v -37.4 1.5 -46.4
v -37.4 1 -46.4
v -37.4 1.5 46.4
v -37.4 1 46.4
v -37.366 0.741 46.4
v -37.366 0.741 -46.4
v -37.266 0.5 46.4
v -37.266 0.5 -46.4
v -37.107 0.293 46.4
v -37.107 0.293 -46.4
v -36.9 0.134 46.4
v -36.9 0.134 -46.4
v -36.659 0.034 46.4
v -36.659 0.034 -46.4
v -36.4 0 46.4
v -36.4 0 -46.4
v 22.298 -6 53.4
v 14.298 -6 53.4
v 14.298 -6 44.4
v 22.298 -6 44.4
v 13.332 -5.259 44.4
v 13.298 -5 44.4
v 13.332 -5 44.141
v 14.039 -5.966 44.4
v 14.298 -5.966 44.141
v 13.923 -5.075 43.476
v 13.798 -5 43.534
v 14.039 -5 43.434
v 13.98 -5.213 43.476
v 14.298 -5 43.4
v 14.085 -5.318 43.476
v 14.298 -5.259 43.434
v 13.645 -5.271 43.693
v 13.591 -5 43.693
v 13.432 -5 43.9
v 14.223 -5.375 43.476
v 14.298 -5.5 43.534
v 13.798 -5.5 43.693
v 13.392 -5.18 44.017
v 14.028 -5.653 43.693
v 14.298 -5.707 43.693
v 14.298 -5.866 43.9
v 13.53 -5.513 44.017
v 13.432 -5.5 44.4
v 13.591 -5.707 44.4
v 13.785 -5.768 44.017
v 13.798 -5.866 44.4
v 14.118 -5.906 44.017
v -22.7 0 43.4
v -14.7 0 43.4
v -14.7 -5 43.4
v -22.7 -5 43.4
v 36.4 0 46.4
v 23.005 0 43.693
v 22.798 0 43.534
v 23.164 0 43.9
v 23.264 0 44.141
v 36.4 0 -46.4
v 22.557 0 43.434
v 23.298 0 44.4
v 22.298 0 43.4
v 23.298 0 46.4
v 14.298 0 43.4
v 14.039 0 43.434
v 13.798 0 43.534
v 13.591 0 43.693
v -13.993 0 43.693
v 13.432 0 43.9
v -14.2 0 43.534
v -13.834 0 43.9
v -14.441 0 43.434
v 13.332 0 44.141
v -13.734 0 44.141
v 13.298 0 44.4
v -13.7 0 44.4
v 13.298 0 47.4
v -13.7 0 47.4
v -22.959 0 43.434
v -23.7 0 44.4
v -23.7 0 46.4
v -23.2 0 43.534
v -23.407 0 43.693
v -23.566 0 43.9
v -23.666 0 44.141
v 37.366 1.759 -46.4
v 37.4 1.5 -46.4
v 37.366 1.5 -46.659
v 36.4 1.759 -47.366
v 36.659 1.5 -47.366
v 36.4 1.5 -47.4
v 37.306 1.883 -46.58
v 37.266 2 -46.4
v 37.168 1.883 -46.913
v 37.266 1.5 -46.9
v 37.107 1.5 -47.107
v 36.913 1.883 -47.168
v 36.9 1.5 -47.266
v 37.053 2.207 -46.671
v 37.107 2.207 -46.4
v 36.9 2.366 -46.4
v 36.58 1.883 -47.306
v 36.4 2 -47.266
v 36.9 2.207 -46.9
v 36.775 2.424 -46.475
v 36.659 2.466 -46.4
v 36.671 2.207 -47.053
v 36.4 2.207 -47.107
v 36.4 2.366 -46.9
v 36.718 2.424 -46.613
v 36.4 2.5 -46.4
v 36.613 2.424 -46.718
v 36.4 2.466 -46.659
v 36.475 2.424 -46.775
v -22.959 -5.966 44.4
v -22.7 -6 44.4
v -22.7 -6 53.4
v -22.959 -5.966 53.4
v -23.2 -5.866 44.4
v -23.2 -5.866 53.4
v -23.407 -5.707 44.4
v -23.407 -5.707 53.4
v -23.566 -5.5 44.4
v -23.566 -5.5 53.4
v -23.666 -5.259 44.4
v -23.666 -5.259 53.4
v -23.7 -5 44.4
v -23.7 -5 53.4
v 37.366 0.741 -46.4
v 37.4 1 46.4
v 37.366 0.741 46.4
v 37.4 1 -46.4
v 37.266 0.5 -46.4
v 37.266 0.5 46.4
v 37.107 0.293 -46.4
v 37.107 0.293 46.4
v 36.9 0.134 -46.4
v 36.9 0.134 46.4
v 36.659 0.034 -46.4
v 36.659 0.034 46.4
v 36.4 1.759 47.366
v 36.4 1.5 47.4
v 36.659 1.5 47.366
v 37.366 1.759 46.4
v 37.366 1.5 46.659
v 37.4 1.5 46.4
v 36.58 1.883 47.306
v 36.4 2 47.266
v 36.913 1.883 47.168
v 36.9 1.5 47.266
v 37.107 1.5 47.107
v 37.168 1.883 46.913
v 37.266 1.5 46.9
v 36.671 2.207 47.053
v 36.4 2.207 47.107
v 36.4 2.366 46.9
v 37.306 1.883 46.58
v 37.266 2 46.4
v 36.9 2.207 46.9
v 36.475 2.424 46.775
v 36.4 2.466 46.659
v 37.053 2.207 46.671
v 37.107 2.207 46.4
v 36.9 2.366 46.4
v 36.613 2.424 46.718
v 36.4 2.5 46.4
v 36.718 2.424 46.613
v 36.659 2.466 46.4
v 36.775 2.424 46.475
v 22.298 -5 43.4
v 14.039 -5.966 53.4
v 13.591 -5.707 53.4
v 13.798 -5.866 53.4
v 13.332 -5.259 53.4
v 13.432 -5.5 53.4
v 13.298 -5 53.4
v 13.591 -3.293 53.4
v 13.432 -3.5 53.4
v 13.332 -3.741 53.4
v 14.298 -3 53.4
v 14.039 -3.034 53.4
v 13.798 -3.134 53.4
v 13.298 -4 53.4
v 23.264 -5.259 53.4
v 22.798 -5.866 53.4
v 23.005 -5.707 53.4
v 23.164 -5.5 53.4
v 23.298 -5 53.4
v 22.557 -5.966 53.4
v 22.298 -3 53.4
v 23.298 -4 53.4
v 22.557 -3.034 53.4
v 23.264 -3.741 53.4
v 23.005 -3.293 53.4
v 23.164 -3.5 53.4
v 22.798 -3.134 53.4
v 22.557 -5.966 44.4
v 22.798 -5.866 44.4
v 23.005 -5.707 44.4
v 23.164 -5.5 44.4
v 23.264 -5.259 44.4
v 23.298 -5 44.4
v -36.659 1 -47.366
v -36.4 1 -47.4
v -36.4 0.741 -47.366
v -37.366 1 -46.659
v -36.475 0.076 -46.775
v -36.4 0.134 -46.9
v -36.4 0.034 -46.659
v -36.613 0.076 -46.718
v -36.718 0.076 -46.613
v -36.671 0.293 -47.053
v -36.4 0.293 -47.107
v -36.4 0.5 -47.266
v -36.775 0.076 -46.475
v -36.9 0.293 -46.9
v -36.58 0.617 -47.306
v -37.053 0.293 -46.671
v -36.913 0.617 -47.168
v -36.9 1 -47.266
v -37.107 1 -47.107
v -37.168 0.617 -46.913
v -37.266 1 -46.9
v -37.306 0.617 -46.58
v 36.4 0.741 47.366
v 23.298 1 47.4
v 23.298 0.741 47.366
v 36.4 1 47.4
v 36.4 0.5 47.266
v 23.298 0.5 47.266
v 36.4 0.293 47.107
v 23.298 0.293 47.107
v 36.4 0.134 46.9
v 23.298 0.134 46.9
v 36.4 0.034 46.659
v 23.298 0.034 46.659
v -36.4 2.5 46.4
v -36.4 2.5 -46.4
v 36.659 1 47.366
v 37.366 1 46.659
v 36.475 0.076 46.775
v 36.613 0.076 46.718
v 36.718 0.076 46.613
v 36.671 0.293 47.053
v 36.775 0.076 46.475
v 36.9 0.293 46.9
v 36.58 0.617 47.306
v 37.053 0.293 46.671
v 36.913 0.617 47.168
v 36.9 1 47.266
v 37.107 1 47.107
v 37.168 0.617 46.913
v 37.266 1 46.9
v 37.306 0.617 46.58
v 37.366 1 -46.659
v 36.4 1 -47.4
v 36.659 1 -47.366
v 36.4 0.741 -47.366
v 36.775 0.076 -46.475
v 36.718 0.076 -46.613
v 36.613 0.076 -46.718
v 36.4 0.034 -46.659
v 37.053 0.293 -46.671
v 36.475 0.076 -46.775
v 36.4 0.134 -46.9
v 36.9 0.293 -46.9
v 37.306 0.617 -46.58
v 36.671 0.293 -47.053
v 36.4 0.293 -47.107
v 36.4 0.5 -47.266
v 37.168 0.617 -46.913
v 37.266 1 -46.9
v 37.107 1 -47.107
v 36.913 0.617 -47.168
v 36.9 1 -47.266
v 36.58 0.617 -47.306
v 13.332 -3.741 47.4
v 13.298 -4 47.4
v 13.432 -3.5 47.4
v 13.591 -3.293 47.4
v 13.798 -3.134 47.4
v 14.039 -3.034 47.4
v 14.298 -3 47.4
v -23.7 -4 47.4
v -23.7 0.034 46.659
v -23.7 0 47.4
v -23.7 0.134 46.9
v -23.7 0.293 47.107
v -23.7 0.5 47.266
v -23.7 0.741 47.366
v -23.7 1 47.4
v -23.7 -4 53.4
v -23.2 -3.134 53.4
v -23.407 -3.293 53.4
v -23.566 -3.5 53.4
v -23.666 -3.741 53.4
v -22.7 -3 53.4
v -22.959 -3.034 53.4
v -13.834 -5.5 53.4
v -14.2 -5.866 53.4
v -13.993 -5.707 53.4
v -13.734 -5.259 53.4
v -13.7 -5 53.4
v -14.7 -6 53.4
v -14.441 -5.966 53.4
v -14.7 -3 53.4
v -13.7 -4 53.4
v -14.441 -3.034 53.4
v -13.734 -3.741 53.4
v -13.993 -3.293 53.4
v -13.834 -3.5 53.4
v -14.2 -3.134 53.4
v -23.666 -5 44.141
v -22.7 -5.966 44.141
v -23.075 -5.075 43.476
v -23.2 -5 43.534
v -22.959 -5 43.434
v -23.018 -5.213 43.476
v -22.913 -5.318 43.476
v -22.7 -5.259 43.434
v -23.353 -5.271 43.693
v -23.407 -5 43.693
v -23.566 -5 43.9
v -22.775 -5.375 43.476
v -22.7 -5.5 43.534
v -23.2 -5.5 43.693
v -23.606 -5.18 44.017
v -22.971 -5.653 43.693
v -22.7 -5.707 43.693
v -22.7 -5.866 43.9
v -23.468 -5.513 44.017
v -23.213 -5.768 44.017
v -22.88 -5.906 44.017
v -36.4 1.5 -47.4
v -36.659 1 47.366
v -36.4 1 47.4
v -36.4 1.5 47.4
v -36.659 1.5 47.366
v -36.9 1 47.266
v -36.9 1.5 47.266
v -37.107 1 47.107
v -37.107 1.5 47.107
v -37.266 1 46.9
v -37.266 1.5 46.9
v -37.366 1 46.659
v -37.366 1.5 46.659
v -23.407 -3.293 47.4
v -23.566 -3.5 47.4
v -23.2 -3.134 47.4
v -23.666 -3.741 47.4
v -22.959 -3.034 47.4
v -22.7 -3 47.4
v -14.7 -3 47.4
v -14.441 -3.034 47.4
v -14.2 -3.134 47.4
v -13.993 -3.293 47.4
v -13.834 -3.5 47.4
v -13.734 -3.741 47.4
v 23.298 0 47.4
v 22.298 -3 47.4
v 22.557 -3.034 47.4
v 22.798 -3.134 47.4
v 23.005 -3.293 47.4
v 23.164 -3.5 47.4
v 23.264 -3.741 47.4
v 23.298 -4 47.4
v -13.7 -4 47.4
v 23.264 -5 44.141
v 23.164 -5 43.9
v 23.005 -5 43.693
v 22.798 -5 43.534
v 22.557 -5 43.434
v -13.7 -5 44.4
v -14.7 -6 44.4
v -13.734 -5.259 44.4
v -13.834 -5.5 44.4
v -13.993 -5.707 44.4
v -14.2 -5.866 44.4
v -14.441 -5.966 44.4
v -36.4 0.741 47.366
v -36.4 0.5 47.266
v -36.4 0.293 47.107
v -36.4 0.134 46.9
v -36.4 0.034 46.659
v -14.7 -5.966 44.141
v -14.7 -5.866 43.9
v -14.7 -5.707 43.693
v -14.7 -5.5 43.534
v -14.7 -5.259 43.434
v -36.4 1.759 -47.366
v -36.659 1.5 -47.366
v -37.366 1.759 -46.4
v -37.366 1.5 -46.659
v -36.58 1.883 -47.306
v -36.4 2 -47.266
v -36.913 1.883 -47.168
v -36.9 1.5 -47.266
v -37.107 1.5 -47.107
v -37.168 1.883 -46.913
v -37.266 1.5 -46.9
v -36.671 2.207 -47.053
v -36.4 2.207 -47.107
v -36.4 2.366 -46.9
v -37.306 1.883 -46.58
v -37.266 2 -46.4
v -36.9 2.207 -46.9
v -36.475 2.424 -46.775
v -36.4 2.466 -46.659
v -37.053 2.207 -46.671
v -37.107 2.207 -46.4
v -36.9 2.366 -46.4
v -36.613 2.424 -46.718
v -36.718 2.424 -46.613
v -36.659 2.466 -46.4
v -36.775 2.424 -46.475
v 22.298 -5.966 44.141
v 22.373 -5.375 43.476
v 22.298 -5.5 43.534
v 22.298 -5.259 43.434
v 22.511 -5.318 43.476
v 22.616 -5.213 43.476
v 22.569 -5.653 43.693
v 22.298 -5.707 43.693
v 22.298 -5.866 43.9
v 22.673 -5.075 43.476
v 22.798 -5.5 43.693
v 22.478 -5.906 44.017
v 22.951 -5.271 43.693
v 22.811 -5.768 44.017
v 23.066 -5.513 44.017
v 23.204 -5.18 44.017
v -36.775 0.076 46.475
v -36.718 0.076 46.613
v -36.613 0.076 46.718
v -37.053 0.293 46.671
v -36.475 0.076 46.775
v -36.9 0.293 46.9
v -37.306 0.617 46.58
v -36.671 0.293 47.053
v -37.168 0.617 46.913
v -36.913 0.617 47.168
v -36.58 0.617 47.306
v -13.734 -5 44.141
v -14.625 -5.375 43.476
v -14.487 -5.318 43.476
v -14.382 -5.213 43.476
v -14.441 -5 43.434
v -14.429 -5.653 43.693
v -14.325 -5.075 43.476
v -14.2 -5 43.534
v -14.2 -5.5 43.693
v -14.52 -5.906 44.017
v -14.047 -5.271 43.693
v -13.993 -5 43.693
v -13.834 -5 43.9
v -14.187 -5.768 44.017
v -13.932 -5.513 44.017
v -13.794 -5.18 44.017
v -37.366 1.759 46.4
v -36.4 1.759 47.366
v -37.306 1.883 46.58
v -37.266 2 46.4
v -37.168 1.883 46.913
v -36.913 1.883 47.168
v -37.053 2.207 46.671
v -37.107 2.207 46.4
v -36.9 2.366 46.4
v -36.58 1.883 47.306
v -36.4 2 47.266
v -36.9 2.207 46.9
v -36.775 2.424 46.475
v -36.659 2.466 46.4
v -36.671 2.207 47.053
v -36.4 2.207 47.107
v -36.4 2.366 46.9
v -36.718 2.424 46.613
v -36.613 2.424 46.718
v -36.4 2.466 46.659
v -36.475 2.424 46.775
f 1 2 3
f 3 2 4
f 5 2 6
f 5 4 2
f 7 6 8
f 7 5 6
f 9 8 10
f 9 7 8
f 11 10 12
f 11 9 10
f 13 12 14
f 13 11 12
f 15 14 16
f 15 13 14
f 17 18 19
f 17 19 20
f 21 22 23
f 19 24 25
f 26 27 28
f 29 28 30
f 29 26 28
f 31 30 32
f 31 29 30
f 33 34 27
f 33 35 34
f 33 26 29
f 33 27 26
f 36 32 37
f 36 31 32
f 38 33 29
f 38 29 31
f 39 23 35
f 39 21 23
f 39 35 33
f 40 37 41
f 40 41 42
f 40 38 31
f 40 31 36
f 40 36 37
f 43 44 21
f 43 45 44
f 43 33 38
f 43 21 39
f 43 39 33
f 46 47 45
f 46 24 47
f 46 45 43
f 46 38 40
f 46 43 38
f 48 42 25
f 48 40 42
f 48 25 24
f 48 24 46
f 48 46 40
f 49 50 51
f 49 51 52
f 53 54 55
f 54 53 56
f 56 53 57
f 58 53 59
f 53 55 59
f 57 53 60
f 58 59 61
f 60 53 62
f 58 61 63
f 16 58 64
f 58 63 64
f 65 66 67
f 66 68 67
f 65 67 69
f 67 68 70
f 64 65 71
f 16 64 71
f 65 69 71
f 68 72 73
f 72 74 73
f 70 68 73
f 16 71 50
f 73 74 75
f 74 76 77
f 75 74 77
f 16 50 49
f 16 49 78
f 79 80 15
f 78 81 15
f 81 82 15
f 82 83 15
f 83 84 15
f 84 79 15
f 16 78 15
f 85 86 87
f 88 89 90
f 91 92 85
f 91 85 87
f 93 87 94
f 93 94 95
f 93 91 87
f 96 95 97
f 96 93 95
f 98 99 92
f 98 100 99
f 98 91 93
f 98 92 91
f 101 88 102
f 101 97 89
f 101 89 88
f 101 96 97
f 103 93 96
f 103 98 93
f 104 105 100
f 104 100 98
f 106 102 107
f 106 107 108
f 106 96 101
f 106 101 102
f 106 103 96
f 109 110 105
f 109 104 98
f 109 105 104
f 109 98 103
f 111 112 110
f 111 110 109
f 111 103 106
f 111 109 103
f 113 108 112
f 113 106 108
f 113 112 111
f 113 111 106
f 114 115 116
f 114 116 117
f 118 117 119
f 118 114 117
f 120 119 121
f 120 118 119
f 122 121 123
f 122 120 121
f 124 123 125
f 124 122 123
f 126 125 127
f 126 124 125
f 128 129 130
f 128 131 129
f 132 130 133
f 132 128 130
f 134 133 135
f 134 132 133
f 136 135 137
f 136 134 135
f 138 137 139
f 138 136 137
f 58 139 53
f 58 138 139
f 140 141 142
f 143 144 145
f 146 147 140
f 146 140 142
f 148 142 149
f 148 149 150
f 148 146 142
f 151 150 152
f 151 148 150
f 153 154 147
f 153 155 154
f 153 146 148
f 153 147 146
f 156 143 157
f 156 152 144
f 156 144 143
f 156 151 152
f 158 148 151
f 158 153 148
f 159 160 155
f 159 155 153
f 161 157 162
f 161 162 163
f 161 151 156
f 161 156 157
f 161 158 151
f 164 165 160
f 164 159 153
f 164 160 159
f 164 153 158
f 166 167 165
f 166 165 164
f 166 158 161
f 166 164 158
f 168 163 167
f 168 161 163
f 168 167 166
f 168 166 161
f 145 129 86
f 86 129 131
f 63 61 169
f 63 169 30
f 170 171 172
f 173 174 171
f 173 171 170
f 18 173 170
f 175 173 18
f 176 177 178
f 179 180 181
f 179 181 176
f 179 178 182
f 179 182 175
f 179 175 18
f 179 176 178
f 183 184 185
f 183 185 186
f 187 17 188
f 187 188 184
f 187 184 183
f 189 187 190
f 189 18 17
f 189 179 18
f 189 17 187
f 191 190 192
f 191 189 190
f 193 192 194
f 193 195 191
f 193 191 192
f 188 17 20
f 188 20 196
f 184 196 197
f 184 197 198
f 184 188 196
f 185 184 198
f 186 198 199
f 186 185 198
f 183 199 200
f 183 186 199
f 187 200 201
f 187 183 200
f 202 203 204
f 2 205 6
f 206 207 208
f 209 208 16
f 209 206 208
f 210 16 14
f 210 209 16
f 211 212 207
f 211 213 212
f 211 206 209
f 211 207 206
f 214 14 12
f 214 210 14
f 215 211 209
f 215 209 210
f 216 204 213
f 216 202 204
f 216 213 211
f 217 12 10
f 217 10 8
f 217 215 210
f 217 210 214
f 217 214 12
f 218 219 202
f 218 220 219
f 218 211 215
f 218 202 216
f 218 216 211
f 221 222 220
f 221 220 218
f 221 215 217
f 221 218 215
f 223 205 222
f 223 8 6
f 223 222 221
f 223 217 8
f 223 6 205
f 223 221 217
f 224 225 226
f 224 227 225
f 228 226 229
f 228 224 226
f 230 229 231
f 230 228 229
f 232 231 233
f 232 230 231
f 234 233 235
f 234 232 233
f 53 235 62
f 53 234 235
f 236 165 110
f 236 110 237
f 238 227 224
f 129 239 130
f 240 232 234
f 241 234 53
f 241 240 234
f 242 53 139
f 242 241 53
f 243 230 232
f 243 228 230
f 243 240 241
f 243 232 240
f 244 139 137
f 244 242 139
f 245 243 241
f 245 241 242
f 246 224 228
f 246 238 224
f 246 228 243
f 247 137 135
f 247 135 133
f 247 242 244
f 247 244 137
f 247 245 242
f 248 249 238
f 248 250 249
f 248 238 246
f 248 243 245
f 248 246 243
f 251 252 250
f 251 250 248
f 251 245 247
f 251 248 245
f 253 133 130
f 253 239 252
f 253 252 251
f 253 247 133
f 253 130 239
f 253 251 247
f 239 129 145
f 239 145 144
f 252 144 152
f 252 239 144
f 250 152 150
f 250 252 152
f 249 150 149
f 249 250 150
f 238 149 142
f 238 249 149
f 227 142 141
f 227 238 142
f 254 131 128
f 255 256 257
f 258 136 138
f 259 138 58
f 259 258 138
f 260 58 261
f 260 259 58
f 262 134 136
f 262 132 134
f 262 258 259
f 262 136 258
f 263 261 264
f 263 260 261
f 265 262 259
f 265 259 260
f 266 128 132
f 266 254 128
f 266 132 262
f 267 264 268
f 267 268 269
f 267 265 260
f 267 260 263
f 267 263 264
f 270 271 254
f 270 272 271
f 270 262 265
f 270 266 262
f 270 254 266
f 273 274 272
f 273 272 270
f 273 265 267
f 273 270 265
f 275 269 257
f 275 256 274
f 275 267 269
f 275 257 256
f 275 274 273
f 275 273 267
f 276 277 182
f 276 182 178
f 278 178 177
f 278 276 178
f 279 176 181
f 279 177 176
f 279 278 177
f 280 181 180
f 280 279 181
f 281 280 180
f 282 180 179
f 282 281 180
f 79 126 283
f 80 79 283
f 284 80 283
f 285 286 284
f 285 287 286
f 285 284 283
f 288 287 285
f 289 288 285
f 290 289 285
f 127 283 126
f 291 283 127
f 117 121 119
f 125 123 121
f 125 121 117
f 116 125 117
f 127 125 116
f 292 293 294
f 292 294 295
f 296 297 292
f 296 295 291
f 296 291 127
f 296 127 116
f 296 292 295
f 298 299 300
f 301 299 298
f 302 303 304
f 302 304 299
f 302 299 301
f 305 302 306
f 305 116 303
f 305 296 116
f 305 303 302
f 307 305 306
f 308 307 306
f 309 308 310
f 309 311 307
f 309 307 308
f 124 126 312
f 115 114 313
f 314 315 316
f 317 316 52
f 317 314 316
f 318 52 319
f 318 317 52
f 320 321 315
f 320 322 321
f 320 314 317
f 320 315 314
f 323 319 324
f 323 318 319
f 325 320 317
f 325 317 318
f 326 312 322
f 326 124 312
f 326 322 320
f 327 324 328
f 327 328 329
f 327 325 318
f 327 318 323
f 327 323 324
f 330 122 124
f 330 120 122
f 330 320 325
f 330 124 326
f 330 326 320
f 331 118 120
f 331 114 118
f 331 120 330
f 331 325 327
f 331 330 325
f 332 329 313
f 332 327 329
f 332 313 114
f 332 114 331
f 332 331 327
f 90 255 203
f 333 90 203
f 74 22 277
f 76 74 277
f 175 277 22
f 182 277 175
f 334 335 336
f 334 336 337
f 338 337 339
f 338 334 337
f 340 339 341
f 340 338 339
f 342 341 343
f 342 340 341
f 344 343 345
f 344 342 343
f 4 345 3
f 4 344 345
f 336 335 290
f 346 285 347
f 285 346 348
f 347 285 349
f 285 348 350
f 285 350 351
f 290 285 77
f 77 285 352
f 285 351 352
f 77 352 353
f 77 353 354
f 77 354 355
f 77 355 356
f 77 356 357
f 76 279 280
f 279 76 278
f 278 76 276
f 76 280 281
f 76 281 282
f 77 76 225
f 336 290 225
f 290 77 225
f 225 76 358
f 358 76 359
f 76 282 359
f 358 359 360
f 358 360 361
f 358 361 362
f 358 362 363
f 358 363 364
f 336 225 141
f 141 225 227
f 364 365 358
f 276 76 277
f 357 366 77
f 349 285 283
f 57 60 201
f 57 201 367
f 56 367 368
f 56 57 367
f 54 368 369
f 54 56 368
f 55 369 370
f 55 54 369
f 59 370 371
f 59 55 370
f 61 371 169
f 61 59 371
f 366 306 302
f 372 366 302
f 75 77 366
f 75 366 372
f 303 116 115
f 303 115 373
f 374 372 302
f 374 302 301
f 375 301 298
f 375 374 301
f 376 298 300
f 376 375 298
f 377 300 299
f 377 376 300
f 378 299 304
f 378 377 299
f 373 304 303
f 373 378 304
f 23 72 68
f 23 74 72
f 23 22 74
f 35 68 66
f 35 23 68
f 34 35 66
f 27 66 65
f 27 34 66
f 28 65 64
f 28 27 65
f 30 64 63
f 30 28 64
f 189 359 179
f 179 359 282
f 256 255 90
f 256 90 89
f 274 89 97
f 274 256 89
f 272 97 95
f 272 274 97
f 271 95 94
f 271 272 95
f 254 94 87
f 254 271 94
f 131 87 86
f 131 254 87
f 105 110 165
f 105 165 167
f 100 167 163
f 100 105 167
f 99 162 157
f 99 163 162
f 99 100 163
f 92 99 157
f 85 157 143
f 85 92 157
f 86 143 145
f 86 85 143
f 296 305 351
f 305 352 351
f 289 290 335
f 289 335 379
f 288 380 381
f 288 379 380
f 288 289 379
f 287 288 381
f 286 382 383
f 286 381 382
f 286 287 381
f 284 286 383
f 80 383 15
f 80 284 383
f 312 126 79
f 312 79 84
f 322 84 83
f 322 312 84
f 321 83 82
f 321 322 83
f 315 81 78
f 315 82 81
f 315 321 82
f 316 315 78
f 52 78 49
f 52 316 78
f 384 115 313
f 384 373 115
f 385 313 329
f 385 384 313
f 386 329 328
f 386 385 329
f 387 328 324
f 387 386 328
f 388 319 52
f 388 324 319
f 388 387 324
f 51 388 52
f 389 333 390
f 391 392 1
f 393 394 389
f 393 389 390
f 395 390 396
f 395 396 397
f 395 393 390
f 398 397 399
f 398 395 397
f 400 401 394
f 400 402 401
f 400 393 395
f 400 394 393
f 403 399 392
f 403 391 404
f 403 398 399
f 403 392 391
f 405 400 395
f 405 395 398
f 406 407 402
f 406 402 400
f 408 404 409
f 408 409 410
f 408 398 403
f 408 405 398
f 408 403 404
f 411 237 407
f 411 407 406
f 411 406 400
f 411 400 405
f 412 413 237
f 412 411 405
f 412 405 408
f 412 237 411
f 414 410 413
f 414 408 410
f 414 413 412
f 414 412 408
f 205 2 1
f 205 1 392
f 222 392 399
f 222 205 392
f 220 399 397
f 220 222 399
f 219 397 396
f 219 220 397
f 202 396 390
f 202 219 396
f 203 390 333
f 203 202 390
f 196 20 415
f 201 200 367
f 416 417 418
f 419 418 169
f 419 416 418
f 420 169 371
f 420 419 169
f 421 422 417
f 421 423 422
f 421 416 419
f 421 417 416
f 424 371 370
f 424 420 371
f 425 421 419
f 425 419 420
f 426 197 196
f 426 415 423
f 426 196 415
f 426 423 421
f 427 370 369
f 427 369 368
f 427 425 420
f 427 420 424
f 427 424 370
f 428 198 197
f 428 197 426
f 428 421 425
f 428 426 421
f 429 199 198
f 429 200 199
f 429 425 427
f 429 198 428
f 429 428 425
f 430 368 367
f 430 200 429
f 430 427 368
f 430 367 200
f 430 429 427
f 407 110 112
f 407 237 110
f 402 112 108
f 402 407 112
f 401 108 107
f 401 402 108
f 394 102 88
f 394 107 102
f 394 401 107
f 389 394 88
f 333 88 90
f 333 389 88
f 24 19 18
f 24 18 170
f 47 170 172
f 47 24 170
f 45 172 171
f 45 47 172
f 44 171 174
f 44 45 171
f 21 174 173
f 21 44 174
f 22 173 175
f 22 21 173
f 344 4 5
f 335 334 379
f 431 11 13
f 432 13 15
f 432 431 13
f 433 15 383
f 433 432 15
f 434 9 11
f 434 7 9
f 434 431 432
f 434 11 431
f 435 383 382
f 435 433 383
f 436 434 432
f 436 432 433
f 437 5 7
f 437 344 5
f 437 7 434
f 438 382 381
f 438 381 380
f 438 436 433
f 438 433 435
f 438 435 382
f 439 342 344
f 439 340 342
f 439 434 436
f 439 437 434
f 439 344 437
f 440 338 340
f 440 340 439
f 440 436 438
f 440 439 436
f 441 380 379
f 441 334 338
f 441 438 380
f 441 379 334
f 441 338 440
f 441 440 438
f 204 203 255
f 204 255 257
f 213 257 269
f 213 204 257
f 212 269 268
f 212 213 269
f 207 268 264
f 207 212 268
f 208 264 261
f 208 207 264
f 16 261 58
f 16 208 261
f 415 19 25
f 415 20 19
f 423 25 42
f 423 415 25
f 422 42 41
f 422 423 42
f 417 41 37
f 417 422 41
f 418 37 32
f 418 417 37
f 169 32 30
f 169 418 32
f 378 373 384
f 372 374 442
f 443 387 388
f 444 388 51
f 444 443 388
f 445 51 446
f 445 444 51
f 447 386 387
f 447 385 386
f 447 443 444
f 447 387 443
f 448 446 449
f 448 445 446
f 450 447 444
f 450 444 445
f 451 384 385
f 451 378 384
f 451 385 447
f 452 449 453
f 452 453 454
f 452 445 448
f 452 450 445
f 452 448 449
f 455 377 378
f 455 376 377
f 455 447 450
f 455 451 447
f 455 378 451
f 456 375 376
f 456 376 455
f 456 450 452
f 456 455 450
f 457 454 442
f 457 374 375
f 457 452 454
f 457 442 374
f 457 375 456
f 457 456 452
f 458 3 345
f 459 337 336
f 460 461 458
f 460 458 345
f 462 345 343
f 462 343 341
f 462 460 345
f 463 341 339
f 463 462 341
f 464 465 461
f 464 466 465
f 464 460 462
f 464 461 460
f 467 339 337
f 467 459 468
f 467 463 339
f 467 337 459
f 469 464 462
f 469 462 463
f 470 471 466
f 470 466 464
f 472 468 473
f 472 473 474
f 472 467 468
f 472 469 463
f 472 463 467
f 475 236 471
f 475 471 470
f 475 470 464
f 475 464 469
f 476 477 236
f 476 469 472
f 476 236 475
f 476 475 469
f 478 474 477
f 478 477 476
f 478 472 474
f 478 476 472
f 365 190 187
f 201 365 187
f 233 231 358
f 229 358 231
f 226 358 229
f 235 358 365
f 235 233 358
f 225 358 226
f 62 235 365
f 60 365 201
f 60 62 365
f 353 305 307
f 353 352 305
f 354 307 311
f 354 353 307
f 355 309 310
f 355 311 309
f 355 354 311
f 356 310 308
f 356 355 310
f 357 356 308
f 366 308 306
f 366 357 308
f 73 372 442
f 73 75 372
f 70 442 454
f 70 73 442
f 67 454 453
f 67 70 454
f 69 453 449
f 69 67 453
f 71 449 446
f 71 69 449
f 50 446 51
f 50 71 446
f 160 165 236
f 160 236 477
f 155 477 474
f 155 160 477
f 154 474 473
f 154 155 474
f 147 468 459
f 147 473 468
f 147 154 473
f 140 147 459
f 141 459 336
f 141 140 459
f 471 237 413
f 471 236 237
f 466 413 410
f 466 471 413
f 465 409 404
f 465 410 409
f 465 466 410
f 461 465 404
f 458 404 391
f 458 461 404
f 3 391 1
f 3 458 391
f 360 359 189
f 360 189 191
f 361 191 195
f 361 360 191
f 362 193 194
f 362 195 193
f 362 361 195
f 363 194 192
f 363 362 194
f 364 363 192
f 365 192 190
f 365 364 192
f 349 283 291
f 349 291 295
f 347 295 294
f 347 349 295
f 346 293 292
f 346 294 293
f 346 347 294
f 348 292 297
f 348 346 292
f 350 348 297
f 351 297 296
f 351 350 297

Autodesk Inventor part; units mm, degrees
ref_plane "YZ Plane" through (0, 0, 0) normal (1, 0, 0) x (0, 1, 0)
ref_plane "XZ Plane" through (0, 0, 0) normal (0, 1, 0) x (-1, 0, 0)
ref_plane "XY Plane" through (0, 0, 0) normal (0, 0, 1) x (1, 0, 0)
sketch "Sketch1" plane through (0, 0, 0) normal (0, 1, 0) x (-1, 0, 0)
  line L0 (36.4, 47.4) -> (-36.4, 47.4)
  line L1 (-37.4, 46.4) -> (-37.4, -46.4)
  line L2 (-36.4, -47.4) -> (36.4, -47.4)
  line L3 (37.4, -46.4) -> (37.4, 46.4)
  line L4 (37.4, 47.4) -> (-37.4, -47.4) construction
  line L5 (-37.4, 47.4) -> (37.4, -47.4) construction
  arc A0 (37.4, 46.4) -> (36.4, 47.4) centre (36.4, 46.4) ccw
  arc A1 (-36.4, 47.4) -> (-37.4, 46.4) centre (-36.4, 46.4) ccw
  arc A2 (-37.4, -46.4) -> (-36.4, -47.4) centre (-36.4, -46.4) ccw
  arc A3 (36.4, -47.4) -> (37.4, -46.4) centre (36.4, -46.4) ccw
  point P0 (0, 0)
  dimension "d0" = 94.8
  dimension "d1" = 74.8
  dimension "d2" = 1
extrude "Extrusion1" add sketch "Sketch1" along normal blind 2.5
sketch "Sketch2" plane through (0, 0, 0) normal (0, -1, 0) x (1, 0, 0)
  line L0 (0, 0) -> (-37.4, 0)
  line L1 (-37.4, 0) -> (-37.4, 47.4)
  line L2 (-37.4, 47.4) -> (0, 47.4)
  line L3 (0, 47.4) -> (0, 0)
  line L4 (-23.7, 51.4) -> (-13.7, 51.4)
  line L5 (-13.7, 51.4) -> (-13.7, 43.4)
  line L6 (-13.7, 43.4) -> (-23.7, 43.4)
  line L7 (-23.7, 43.4) -> (-23.7, 51.4)
  line L8 (-36.4, 47.4) -> (36.4, 47.4) projected
  line L9 (-23.7, 51.4) -> (-13.7, 43.4) construction
  line L10 (-13.7, 51.4) -> (-23.7, 43.4) construction
  line L11 (0, 0) -> (36.5961, 0)
  line L12 (36.5961, 0) -> (36.5961, 47.4)
  line L13 (36.5961, 47.4) -> (0, 47.4)
  line L14 (0, 47.4) -> (0, 0)
  line L15 (13.2981, 51.4) -> (23.2981, 51.4)
  line L16 (23.2981, 51.4) -> (23.2981, 43.4)
  line L17 (23.2981, 43.4) -> (13.2981, 43.4)
  line L18 (13.2981, 43.4) -> (13.2981, 51.4)
  line L19 (13.2981, 51.4) -> (23.2981, 43.4) construction
  line L20 (23.2981, 51.4) -> (13.2981, 43.4) construction
  point P0 (-18.7, 47.4)
  point P1 (18.2981, 47.4)
  point P2 (23.2981, 47.4)
  point P3 (13.2981, 47.4)
  point P4 (-13.7, 47.4)
  point P5 (-23.7, 47.4)
  dimension "d5" = 10
  dimension "d6" = 8
  dimension "d7" = 10
  dimension "d8" = 8
extrude "Extrusion2" add sketch "Sketch2" along normal blind 6 contours L5 L6 L7 L2 | L8 L16 L17 L18
sketch "Sketch3" plane through (-36.4, 2.5, 47.4) normal (0, 0, 1) x (1, 0, 0)
  line L0 (12.7, -8.5) -> (22.7, -8.5) projected
  line L1 (22.7, -2.5) -> (22.7, -8.5) projected
  line L2 (13.7, -8.5) -> (21.7, -8.5)
  line L3 (22.7, -7.5) -> (22.7, -6.5)
  line L4 (21.7, -5.5) -> (13.7, -5.5)
  line L5 (12.7, -6.5) -> (12.7, -7.5)
  line L6 (59.6981, -2.5) -> (59.6981, -8.5) projected
  line L7 (50.6981, -8.5) -> (58.6981, -8.5)
  line L8 (59.6981, -7.5) -> (59.6981, -6.5)
  line L9 (58.6981, -5.5) -> (50.6981, -5.5)
  line L10 (49.6981, -6.5) -> (49.6981, -7.5)
  arc A0 (13.7, -5.5) -> (12.7, -6.5) centre (13.7, -6.5) ccw
  arc A1 (22.7, -6.5) -> (21.7, -5.5) centre (21.7, -6.5) ccw
  arc A2 (21.7, -8.5) -> (22.7, -7.5) centre (21.7, -7.5) ccw
  arc A3 (12.7, -7.5) -> (13.7, -8.5) centre (13.7, -7.5) ccw
  arc A4 (50.6981, -5.5) -> (49.6981, -6.5) centre (50.6981, -6.5) ccw
  arc A5 (59.6981, -6.5) -> (58.6981, -5.5) centre (58.6981, -6.5) ccw
  arc A6 (58.6981, -8.5) -> (59.6981, -7.5) centre (58.6981, -7.5) ccw
  arc A7 (49.6981, -7.5) -> (50.6981, -8.5) centre (50.6981, -7.5) ccw
  line L11 (49.0159, -7.1882) -> (60.5232, -7.1882)
  line L12 (60.5232, -7.1882) -> (60.5232, -9.9786)
  line L13 (60.5232, -9.9786) -> (49.0159, -9.9786)
  line L14 (49.0159, -9.9786) -> (49.0159, -7.1882)
  line L15 (11.7436, -7.1882) -> (24.9599, -7.1882)
  line L16 (24.9599, -7.1882) -> (24.9599, -11.0237)
  line L17 (24.9599, -11.0237) -> (11.7436, -11.0237)
  line L18 (11.7436, -11.0237) -> (11.7436, -7.1882)
  line L19 (49.6981, -8.5) -> (59.6981, -8.5) projected
  line L20 (49.0159, -8.5834) -> (59.6981, -8.5)
  line L21 (49.6981, -8.5) -> (59.6981, -8.5)
  point P0 (36.4, -2.5)
  point P1 (22.7, -5.5)
  point P2 (59.6981, -5.5)
  point P3 (12.7, -7.1882)
  point P4 (22.7, -7.1882)
  point P5 (49.6981, -7.1882)
  dimension "d11" = 1
extrude "Extrusion3" add sketch "Sketch3" along normal blind 6 contours A3 L5 L15 L1 A2 L0 | L5 A0 L4 A1 L1 L15 | A6 L7 A7 L10 L11 L6 | L11 L10 A4 L9 A5 L6
extrude "Extrusion4" cut sketch "Sketch3" against normal blind 6 contours L0 L1 L15 L16 L17 L18 L5 A3 | A2 L1 L0 | L6 L19 A6 | L20 L14 L11 L10 A7 L7 L19
fillet "Fillet1" radius 1 10 edges at (23.0052, -5.7071, 43.4) (18.2981, -6, 43.4) (13.591, -5.7071, 43.4) (13.2981, -2.5, 43.4) (23.2981, -2.5, 43.4) (-13.9929, -5.7071, 43.4) (-18.7, -6, 43.4) (-23.4071, -5.7071, 43.4) (-23.7, -2.5, 43.4) (-13.7, -2.5, 43.4)
fillet "Fillet2" radius 1 17 edges at (37.1071, 0, -47.1071) (0, 0, -47.4) (-37.1071, 0, -47.1071) (-37.4, 0, 0) (-37.1071, 0, 47.1071) (-30.05, 0, 47.4) (37.1071, 0, 47.1071) (29.849, 0, 47.4) (37.4, 0, 0) (37.1071, 2.5, -47.1071) (0, 2.5, -47.4) (-37.1071, 2.5, -47.1071) (-37.4, 2.5, 0) (-37.1071, 2.5, 47.1071) (0, 2.5, 47.4) (37.1071, 2.5, 47.1071) (37.4, 2.5, 0)
properties part number "tapa decaja 2"
